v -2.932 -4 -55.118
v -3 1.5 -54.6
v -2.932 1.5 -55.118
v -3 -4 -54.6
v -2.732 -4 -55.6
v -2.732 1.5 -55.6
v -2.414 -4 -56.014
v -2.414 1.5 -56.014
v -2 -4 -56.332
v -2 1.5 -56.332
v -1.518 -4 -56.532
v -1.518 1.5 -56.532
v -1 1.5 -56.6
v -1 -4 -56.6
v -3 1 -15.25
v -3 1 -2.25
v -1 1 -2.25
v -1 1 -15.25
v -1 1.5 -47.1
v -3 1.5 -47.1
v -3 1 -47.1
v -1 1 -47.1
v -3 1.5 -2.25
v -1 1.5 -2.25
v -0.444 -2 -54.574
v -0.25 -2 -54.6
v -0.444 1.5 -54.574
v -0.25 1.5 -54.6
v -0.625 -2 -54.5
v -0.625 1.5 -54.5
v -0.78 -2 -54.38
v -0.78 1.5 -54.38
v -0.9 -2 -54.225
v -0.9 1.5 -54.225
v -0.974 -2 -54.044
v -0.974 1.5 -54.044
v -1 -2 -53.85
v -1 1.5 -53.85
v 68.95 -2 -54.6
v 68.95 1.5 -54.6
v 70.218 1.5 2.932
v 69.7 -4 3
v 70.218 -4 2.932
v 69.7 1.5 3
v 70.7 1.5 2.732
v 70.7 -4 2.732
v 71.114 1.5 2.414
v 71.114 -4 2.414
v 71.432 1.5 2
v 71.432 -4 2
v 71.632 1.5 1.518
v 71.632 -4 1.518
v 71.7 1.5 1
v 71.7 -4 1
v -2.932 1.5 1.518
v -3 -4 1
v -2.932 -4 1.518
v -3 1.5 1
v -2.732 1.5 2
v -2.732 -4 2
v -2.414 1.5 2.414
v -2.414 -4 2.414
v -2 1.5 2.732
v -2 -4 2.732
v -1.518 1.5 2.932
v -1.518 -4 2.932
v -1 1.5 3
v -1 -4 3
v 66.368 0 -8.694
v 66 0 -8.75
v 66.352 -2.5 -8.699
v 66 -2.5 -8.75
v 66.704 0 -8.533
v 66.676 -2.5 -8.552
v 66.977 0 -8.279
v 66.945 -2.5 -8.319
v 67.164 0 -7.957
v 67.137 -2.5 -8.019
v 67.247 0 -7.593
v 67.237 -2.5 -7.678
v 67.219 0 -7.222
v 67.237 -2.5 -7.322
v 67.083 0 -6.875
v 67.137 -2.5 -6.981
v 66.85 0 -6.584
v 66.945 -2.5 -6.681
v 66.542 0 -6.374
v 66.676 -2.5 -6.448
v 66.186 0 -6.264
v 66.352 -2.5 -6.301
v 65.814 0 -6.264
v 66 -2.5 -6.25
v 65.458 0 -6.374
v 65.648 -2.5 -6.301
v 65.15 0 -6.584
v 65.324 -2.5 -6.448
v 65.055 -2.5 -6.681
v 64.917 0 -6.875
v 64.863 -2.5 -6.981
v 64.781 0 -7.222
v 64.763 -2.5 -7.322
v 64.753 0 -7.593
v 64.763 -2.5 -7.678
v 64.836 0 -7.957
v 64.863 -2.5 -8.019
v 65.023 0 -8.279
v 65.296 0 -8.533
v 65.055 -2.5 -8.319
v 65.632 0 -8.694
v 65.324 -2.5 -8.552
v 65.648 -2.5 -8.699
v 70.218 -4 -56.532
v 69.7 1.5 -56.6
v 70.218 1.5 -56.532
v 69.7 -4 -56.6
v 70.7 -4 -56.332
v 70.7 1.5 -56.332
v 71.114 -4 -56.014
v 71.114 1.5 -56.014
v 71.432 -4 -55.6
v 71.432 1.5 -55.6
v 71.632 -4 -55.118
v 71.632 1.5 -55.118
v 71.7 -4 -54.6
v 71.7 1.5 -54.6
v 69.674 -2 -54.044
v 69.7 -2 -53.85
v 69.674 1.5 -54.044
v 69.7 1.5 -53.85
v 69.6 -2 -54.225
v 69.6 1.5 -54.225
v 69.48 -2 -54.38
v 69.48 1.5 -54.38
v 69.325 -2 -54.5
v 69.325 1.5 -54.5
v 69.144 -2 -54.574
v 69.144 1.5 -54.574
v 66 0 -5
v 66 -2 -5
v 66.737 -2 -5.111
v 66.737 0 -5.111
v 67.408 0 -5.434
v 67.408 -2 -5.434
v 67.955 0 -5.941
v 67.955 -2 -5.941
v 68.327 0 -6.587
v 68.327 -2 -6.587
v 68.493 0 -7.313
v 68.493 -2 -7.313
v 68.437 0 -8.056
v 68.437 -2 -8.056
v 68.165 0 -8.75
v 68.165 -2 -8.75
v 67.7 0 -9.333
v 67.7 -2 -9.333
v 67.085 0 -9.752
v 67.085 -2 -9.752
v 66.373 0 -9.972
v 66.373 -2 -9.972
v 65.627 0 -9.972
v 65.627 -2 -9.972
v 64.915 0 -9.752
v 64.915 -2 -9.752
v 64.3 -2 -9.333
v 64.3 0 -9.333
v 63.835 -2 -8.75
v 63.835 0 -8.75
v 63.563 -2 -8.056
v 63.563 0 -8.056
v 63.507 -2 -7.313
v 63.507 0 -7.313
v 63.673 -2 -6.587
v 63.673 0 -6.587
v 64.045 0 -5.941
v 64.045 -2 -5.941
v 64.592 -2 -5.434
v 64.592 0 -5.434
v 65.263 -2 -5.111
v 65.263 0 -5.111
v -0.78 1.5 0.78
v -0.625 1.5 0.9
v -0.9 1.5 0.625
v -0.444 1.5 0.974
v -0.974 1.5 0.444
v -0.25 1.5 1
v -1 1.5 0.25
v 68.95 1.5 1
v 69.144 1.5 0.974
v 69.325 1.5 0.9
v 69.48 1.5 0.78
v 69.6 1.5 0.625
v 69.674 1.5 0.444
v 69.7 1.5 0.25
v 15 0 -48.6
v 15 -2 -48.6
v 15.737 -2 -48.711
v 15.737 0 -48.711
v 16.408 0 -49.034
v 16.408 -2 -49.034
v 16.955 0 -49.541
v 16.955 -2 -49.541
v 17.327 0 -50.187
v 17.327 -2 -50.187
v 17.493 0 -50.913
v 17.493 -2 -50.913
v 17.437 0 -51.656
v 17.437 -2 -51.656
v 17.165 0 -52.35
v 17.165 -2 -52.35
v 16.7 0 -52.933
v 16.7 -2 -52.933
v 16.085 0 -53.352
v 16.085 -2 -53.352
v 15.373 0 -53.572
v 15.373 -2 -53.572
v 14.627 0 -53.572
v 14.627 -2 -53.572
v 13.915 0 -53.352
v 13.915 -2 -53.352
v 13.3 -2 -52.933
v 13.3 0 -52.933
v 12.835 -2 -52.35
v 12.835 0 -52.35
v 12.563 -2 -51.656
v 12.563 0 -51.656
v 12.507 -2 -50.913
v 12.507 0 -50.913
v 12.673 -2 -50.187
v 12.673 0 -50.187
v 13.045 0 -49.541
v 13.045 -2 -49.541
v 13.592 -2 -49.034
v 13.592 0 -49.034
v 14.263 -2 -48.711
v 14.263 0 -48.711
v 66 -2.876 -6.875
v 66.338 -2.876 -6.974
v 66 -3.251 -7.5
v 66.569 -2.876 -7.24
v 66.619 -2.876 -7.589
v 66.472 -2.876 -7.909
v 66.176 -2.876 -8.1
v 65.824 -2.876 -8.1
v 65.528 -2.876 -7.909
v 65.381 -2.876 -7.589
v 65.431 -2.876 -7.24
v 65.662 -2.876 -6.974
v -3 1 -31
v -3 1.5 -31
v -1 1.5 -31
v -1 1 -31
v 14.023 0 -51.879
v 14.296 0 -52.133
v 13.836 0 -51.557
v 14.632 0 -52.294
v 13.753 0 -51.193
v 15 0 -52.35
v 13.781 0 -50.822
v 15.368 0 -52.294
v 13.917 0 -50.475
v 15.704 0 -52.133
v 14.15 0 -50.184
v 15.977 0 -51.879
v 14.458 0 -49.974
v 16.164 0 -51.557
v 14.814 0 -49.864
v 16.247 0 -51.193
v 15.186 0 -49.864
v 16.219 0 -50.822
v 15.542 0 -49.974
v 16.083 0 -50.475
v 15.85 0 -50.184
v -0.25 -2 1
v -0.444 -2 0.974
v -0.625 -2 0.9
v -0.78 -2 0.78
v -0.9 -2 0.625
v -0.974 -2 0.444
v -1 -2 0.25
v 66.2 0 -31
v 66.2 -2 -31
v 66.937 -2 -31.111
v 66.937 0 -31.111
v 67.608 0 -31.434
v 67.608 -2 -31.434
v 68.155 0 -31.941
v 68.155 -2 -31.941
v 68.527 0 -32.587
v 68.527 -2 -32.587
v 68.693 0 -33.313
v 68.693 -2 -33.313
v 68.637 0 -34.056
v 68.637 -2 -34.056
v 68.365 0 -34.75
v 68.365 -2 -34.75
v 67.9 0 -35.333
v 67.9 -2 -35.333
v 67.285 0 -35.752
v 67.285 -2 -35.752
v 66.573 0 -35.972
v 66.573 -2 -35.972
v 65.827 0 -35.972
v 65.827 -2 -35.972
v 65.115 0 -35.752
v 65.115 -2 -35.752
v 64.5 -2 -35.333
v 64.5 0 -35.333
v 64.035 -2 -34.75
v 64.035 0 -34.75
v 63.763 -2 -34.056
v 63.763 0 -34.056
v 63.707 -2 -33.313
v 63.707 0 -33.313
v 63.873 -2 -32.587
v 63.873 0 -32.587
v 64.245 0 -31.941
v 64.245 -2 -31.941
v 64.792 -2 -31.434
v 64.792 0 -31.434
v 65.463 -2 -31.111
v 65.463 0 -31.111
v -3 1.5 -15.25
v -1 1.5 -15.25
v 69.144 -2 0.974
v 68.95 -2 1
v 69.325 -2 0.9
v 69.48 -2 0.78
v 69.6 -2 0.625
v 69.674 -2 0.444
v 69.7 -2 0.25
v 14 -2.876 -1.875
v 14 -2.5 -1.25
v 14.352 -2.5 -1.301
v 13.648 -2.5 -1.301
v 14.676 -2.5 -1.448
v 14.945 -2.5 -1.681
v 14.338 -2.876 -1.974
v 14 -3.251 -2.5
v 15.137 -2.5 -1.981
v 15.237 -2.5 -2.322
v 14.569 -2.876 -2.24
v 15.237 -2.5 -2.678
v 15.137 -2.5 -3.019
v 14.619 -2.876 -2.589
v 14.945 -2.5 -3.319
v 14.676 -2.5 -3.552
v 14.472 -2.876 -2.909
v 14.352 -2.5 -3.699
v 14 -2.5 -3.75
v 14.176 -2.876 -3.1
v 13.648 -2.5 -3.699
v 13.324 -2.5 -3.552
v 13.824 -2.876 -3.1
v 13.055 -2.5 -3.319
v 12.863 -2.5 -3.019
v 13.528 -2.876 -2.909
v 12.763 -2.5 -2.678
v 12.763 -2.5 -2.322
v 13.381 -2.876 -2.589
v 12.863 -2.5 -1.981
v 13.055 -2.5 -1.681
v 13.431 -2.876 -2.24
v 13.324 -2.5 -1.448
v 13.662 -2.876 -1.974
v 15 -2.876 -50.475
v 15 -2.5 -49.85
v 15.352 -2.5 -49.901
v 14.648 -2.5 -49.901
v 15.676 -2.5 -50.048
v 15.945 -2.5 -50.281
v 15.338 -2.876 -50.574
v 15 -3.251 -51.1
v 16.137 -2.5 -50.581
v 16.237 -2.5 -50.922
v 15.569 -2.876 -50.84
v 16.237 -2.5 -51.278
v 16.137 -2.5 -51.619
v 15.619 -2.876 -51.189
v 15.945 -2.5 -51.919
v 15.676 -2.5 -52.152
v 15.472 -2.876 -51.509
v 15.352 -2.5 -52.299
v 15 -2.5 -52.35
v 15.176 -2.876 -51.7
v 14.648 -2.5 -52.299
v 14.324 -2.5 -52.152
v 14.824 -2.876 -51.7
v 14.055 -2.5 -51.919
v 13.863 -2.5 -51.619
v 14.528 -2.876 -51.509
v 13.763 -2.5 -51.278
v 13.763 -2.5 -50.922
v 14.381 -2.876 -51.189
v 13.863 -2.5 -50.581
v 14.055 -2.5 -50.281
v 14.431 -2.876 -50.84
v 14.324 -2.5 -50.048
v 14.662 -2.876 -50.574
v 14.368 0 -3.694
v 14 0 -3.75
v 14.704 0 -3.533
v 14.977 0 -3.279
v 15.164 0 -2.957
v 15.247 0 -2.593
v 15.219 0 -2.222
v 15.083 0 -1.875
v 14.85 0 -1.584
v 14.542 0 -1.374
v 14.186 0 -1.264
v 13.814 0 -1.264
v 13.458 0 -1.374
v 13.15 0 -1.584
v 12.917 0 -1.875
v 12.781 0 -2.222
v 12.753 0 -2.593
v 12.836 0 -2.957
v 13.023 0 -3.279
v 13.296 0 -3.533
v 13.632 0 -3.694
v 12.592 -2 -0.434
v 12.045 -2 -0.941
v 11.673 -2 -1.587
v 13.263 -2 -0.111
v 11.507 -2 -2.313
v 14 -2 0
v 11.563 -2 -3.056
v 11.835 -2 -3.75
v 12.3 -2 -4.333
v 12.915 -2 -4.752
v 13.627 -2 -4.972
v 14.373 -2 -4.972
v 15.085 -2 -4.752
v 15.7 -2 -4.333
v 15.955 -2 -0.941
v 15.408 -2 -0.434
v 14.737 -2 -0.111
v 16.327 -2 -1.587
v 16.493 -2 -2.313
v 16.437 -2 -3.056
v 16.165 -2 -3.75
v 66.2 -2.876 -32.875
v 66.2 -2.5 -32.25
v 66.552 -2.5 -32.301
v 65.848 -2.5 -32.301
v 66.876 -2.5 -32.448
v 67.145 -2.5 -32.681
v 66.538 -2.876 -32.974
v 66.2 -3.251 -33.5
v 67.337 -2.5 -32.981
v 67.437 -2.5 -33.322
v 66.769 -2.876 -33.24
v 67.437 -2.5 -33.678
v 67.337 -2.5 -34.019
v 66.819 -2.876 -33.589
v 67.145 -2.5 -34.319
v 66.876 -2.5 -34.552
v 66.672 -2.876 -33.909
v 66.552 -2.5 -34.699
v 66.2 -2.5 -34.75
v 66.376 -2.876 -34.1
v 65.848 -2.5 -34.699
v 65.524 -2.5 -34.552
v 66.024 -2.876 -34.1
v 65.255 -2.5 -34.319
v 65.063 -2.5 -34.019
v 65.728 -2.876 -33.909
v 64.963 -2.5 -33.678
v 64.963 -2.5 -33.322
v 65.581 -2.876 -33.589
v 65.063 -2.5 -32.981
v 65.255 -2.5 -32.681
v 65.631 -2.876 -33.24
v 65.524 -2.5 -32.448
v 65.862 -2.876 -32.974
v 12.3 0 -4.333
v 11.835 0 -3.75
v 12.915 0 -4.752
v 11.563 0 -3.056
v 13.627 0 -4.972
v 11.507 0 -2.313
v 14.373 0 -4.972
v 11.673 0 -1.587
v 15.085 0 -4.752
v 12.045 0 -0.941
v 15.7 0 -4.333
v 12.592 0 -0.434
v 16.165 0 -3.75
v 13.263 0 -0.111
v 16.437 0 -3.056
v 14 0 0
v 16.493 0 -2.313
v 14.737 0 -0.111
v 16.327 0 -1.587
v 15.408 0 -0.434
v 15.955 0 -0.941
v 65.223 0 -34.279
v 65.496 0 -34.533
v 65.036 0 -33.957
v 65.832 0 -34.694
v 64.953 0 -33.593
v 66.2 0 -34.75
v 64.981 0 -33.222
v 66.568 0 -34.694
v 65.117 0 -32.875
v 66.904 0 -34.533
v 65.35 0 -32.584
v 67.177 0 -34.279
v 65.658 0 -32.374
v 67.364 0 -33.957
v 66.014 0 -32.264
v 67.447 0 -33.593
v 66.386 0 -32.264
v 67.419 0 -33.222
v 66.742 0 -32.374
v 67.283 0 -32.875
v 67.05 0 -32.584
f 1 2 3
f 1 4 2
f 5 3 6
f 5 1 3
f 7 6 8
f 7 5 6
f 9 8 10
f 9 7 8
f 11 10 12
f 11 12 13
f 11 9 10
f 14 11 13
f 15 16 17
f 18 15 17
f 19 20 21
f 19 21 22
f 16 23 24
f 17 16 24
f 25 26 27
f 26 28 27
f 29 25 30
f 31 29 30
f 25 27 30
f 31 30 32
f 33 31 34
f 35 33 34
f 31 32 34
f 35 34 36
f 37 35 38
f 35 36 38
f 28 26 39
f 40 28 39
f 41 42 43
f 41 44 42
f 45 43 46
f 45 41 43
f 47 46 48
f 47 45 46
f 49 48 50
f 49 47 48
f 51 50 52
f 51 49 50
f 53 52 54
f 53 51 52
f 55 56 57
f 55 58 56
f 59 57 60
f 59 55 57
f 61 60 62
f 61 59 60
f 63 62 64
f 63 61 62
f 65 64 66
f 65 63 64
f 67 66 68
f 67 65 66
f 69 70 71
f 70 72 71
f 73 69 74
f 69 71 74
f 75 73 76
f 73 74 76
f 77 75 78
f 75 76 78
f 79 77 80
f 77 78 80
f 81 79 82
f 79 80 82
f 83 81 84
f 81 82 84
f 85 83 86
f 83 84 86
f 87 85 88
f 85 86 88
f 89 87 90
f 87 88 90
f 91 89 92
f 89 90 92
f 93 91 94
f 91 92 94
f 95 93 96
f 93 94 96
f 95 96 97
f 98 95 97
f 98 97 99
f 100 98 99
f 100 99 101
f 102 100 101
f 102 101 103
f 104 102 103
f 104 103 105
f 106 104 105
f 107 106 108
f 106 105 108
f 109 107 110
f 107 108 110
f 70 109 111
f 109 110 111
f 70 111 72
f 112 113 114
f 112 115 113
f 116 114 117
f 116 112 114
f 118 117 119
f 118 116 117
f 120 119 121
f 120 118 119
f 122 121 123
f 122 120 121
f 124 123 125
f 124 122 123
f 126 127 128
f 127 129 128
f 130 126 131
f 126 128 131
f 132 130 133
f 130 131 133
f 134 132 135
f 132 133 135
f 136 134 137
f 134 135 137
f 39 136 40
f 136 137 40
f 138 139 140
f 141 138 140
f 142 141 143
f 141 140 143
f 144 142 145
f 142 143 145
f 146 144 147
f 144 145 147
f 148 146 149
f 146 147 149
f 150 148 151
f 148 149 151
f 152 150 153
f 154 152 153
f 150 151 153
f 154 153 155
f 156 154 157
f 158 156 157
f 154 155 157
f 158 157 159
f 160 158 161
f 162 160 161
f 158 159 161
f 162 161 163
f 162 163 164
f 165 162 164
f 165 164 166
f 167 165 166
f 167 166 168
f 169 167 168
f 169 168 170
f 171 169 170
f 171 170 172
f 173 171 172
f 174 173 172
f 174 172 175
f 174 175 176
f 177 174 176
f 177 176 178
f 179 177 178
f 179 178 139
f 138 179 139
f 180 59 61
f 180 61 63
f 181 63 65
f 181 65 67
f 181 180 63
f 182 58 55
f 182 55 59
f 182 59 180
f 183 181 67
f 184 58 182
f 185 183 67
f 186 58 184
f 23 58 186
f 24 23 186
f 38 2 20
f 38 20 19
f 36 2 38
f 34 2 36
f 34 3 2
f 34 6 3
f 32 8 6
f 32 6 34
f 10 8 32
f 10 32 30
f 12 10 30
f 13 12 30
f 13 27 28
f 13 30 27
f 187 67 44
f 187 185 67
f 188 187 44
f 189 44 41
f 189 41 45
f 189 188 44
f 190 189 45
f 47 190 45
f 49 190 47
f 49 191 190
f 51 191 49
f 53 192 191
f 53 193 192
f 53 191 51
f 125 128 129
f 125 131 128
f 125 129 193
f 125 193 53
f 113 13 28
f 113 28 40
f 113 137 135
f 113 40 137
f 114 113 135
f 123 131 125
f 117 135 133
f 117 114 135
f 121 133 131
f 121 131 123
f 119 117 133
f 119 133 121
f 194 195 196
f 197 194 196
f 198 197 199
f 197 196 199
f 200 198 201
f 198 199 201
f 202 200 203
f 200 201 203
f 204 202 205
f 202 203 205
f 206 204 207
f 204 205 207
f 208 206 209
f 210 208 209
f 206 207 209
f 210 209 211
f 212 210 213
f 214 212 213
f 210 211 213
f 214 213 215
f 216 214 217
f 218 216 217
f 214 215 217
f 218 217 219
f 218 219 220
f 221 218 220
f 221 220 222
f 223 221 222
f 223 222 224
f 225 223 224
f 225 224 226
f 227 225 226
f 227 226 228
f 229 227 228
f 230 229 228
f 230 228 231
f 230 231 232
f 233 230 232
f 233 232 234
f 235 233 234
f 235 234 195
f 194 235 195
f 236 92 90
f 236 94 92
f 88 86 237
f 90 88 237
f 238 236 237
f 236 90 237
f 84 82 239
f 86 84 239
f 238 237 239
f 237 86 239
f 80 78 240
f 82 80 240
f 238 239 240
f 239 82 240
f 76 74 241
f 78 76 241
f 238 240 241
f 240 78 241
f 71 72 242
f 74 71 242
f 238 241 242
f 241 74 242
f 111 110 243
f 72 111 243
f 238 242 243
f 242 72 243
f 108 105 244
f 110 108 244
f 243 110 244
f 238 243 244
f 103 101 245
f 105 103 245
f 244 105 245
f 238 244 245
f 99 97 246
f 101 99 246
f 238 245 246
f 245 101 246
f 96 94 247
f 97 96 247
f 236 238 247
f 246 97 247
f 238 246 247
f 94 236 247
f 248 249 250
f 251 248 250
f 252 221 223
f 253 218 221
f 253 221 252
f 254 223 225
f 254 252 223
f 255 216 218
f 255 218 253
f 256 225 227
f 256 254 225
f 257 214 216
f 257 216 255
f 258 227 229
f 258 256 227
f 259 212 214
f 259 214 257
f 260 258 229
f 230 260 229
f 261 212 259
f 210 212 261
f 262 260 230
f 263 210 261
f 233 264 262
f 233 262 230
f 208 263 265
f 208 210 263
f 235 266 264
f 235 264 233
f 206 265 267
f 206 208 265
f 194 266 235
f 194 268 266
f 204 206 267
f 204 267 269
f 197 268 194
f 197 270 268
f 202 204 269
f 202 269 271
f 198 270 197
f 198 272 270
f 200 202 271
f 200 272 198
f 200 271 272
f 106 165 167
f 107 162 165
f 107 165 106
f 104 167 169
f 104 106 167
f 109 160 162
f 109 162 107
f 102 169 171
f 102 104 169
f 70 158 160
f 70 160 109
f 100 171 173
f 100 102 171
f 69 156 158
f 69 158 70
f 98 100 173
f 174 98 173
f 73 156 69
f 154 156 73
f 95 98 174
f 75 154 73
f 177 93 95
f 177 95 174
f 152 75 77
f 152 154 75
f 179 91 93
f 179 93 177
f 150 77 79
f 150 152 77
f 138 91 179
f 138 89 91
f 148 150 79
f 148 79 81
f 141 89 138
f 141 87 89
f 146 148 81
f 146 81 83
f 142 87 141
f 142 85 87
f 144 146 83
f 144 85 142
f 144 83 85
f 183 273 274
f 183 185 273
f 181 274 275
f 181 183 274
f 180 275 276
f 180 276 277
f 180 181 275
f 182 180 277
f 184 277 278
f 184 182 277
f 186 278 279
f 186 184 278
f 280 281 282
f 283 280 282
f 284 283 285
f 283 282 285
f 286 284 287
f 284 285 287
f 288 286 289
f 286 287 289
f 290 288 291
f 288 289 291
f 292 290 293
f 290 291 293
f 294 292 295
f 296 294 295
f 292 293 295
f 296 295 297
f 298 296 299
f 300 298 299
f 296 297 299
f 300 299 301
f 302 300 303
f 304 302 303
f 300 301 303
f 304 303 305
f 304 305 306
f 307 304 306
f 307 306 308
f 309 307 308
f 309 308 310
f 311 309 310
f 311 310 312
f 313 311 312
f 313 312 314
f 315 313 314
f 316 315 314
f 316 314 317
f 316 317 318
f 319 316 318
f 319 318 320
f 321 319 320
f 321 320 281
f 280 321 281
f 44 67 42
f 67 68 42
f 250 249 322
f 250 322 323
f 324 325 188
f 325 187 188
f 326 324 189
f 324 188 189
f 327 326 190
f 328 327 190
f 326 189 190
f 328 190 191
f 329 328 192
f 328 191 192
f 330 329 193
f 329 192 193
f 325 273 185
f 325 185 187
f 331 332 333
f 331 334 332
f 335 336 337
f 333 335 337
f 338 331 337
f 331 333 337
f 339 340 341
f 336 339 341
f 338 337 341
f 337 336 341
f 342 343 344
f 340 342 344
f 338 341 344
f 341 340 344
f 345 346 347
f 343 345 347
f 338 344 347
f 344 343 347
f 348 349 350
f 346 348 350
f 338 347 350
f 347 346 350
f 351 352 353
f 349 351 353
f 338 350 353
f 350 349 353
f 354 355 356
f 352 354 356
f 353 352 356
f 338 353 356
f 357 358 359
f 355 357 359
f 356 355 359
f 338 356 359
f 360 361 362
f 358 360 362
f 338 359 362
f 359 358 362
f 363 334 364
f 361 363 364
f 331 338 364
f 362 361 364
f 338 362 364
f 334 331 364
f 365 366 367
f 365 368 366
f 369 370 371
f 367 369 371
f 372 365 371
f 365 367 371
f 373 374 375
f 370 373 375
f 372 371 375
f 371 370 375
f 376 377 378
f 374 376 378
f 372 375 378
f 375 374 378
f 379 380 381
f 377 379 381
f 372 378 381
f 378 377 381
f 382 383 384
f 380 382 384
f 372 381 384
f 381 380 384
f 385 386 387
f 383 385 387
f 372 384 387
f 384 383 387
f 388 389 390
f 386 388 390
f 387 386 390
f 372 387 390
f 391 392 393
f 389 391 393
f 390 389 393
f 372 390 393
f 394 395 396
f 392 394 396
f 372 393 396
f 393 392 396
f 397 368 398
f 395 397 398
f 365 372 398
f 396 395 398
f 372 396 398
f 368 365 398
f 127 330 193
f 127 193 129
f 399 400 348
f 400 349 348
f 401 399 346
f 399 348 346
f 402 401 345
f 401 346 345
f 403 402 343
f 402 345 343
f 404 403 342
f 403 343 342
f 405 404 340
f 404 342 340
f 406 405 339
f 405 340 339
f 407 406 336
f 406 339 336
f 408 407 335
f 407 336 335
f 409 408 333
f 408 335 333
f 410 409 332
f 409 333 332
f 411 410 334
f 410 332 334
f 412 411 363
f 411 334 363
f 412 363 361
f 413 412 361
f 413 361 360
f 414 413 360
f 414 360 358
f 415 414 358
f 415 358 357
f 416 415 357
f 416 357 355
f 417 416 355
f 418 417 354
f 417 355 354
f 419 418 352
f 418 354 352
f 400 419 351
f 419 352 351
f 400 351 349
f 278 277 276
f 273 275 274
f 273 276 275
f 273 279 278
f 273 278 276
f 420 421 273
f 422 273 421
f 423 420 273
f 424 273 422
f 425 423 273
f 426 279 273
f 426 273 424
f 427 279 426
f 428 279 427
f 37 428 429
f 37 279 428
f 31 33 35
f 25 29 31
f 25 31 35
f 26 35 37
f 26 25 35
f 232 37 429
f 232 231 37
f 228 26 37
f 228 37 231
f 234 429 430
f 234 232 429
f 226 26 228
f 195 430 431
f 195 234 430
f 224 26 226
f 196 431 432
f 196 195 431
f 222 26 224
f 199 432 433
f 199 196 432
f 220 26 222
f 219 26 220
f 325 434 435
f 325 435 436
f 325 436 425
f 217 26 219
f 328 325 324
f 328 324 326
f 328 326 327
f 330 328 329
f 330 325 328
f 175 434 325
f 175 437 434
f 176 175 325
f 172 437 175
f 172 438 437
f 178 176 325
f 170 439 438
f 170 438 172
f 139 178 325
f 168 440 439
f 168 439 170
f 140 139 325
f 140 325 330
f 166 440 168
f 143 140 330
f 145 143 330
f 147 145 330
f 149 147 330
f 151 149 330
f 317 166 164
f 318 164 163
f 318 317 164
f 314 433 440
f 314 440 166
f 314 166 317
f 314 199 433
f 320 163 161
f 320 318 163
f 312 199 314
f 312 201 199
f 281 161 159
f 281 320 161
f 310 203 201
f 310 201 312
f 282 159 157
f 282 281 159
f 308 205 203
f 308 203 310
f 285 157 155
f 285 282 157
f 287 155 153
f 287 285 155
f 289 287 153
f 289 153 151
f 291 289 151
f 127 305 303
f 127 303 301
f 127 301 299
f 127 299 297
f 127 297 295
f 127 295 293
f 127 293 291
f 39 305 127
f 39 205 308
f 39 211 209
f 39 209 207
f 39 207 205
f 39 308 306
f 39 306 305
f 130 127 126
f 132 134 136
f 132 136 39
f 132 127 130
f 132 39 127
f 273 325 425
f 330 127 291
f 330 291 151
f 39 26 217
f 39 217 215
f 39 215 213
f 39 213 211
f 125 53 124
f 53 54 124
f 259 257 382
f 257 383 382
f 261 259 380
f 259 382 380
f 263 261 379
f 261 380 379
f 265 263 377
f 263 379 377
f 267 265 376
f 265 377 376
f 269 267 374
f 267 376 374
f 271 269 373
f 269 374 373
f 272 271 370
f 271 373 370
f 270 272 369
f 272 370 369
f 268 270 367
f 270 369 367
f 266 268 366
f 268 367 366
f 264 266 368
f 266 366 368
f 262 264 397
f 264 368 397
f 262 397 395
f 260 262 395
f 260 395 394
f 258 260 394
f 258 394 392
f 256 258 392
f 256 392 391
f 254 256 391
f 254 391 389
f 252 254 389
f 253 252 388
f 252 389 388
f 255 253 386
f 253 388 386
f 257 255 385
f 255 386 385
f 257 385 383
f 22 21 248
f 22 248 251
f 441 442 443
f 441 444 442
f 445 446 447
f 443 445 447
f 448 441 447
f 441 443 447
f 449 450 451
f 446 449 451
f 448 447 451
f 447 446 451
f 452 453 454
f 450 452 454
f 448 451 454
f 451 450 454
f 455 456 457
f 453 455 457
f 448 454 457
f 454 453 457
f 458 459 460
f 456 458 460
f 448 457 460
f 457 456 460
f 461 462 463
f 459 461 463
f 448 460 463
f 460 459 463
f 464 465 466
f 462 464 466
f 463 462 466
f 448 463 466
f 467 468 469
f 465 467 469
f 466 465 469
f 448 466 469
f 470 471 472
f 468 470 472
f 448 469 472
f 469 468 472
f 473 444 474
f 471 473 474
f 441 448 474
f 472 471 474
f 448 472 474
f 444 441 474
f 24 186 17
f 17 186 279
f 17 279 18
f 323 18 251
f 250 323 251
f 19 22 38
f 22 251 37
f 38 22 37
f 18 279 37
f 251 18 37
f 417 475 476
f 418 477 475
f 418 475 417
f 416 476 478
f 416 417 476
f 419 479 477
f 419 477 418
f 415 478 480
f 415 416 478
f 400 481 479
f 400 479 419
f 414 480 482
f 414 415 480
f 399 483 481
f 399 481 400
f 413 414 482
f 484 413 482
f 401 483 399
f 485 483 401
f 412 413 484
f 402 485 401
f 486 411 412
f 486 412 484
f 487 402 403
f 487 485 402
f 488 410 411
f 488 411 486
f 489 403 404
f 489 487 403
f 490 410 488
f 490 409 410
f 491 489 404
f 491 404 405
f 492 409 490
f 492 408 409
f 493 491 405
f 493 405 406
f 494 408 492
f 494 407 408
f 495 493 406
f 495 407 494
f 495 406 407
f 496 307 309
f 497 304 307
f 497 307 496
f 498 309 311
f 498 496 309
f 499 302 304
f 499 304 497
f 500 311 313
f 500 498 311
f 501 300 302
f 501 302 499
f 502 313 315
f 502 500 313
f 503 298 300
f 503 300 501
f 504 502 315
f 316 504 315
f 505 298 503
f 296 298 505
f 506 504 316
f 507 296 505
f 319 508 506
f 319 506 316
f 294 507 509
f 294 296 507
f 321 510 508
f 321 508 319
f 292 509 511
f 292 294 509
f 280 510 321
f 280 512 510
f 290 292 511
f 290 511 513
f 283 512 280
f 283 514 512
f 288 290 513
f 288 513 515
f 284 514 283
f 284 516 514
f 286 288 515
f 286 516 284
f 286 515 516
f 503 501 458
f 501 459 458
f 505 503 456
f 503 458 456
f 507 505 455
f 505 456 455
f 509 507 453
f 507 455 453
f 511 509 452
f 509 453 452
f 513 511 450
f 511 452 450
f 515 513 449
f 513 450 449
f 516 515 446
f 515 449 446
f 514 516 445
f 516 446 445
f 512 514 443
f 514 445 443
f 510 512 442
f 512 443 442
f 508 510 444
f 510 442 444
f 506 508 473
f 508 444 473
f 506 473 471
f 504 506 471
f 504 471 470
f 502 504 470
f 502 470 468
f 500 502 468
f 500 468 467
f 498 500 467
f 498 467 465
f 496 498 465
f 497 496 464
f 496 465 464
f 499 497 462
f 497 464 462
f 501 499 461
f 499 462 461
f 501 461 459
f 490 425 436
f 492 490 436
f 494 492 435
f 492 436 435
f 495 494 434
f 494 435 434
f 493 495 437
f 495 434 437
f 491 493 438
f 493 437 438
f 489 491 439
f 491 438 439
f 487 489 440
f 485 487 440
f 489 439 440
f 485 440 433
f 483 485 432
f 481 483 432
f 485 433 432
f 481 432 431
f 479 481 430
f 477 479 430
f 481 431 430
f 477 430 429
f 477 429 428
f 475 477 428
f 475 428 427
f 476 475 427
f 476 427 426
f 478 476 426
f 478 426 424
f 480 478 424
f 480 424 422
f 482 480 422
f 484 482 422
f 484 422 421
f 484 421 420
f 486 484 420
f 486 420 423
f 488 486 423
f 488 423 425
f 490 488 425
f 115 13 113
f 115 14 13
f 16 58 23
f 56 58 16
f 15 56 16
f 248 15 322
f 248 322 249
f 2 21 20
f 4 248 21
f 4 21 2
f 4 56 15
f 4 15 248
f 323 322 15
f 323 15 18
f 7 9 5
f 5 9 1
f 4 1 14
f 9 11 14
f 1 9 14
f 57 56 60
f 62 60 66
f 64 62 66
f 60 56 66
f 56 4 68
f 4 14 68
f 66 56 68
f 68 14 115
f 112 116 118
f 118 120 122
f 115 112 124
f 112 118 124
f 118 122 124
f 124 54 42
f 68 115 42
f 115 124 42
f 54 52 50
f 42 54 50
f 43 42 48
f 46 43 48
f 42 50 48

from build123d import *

# Parameters (mm, degrees)
BOSS_EXTRUDE1_START       = -2
SKETCH2_W                 = 74.7
SKETCH2_H                 = 59.6
BOSS_EXTRUDE1_DEPTH       = 2
BOSS_EXTRUDE2_START       = -2
SKETCH3_W                 = 74.7
SKETCH3_H                 = 59.6
SKETCH3_W_2               = 70.7
SKETCH3_H_2               = 55.6
BOSS_EXTRUDE2_DEPTH       = 3.5
BOSS_EXTRUDE3_START       = -4
SKETCH4_R                 = 2.5
BOSS_EXTRUDE3_DEPTH       = 4
M3X0_5_TAPPED_HOLE2_D     = 2.5
M3X0_5_TAPPED_HOLE2_DEPTH = 2.5
M3X0_5_TAPPED_HOLE2_TIP   = 0.751075774
FILLET1_R                 = 0.75
FILLET2_R                 = 2
SKETCH15_W                = 2
SKETCH15_H                = 13
SKETCH15_H_2              = 16.1
CUT_EXTRUDE1_DEPTH        = 0.5


with BuildPart() as part:
    # Sketch2 → Boss-Extrude1 (new body)
    with BuildSketch(Plane(origin=(0, 0, 0), x_dir=(1, 0, 0), z_dir=(0, 1, 0)).offset(BOSS_EXTRUDE1_START)):
        with Locations((34.35, 26.8)):
            Rectangle(SKETCH2_W, SKETCH2_H)
    extrude(amount=-BOSS_EXTRUDE1_DEPTH)

    # Sketch3 → Boss-Extrude2 (add)
    with BuildSketch(Plane(origin=(0, 0, 0), x_dir=(1, 0, 0), z_dir=(0, 1, 0)).offset(BOSS_EXTRUDE2_START)):
        with Locations((34.35, 26.8)):
            Rectangle(SKETCH3_W, SKETCH3_H)
        with Locations((34.35, 26.8)):
            Rectangle(SKETCH3_W_2, SKETCH3_H_2, mode=Mode.SUBTRACT)
    extrude(amount=BOSS_EXTRUDE2_DEPTH)

    # Sketch4 → Boss-Extrude3 (add)
    with BuildSketch(Plane(origin=(0, 0, 0), x_dir=(1, 0, 0), z_dir=(0, 1, 0)).offset(BOSS_EXTRUDE3_START)):
        with Locations(Location((14, 2.5, 0), (0, 0, 270))):
            Circle(SKETCH4_R)
        with Locations(Location((15, 51.1, 0), (0, 0, 270))):
            Circle(SKETCH4_R)
        with Locations(Location((66.2, 33.5, 0), (0, 0, 270))):
            Circle(SKETCH4_R)
        with Locations(Location((66, 7.5, 0), (0, 0, 270))):
            Circle(SKETCH4_R)
    extrude(amount=BOSS_EXTRUDE3_DEPTH)

    # M3x0.5 Tapped Hole2
    with Locations(Plane(origin=(66, 0, -7.5), x_dir=(0, 0, 1), z_dir=(0, 1, 0))):
        with Locations((0, 0), (-26, 0.2), (-43.6, -51), (5, -52)):
            Hole(M3X0_5_TAPPED_HOLE2_D / 2, depth=M3X0_5_TAPPED_HOLE2_DEPTH)
            with Locations((0, 0, -(M3X0_5_TAPPED_HOLE2_DEPTH + M3X0_5_TAPPED_HOLE2_TIP / 2))):  # 118° drill point
                Cone(0, M3X0_5_TAPPED_HOLE2_D / 2, M3X0_5_TAPPED_HOLE2_TIP, mode=Mode.SUBTRACT)

    # Fillet1
    fillet1_edges = [part.edges().sort_by_distance(p)[0] for p in [
        (-1, -0.25, 1),
        (-1, -0.25, -54.6),
        (69.7, -0.25, -54.6),
        (69.7, -0.25, 1),
    ]]
    fillet(fillet1_edges, radius=FILLET1_R)

    # Fillet2
    fillet2_edges = [part.edges().sort_by_distance(p)[0] for p in [
        (71.7, -1.25, -56.6),
        (71.7, -1.25, 3),
        (-3, -1.25, 3),
        (-3, -1.25, -56.6),
    ]]
    fillet(fillet2_edges, radius=FILLET2_R)

    # Sketch15 → Cut-Extrude1 (cut)
    with BuildSketch(Plane(origin=(0, 1.5, 0), x_dir=(1, 0, 0), z_dir=(0, 1, 0))):
        with Locations((-2, 8.75)):
            Rectangle(SKETCH15_W, SKETCH15_H)
        with Locations((-2, 39.05)):
            Rectangle(SKETCH15_W, SKETCH15_H_2)
    extrude(amount=-CUT_EXTRUDE1_DEPTH, mode=Mode.SUBTRACT)


solid = part.part
